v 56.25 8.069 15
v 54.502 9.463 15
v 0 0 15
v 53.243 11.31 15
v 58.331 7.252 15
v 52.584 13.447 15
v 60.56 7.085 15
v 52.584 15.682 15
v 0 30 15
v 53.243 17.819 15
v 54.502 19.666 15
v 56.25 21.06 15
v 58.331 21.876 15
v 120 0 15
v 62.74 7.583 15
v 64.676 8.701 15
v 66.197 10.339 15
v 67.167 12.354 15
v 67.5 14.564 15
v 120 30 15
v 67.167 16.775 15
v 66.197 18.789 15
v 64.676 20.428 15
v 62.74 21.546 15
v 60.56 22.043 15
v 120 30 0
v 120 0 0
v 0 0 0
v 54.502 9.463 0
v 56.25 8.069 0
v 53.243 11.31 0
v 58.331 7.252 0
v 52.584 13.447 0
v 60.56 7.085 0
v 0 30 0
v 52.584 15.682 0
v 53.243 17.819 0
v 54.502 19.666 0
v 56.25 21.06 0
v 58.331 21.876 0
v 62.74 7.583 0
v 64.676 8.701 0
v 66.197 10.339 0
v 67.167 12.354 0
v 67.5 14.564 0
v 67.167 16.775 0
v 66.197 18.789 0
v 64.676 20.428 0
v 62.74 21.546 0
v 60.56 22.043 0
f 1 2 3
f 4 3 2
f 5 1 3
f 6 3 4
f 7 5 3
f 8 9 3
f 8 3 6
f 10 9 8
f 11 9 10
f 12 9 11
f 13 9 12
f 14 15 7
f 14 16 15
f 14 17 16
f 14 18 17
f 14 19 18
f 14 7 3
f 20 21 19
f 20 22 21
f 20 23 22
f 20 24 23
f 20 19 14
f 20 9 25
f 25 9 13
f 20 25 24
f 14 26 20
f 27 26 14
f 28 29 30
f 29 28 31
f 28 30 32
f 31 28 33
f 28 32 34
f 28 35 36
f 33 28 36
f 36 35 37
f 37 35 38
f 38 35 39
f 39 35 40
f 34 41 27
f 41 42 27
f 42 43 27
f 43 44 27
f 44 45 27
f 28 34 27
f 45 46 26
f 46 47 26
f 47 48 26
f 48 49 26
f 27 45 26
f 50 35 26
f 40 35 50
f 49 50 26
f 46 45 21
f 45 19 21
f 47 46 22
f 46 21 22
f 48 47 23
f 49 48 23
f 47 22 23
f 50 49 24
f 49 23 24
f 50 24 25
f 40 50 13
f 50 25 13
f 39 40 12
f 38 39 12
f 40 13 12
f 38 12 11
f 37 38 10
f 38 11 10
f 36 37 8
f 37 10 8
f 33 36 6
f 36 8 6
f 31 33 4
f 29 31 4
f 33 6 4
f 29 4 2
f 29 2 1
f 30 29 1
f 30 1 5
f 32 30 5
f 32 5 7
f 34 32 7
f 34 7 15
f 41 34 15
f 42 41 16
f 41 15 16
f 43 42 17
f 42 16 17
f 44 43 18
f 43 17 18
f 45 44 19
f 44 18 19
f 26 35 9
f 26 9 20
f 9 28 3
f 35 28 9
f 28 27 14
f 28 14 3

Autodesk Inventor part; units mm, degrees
ref_plane "YZ Plane" through (0, 0, 0) normal (1, 0, 0) x (0, 1, 0)
ref_plane "XZ Plane" through (0, 0, 0) normal (0, 1, 0) x (-1, 0, 0)
ref_plane "XY Plane" through (0, 0, 0) normal (0, 0, 1) x (1, 0, 0)
sketch "스케치1" plane through (0, 0, 0) normal (0, 0, 1) x (1, 0, 0)
  line L0 (0, 30) -> (120, 30)
  line L1 (120, 30) -> (120, 0)
  line L2 (120, 0) -> (0, 0)
  line L3 (0, 0) -> (0, 30)
  dimension "d0" = 120
  dimension "d1" = 30
extrude "돌출1" add sketch "스케치1" along normal blind 15
sketch "스케치2" plane through (0, 0, 15) normal (0, 0, 1) x (1, 0, 0)
  circle A0 centre (30, 15) radius 7.5
  line L0 (120, 30) -> (0, 30) projected
  point P0 (0, 0)
  dimension "d4" = 15
  dimension "d5" = 15
sketch "스케치3" plane through (0, 0, 15) normal (0, 0, 1) x (1, 0, 0)
  circle A0 centre (60, 14.5644) radius 7.5
  line L0 (0, 30) -> (0, 0) projected
  dimension "d8" = 60
extrude "돌출2" cut sketch "스케치3" against normal up to surface (15 mm away)
properties part number "lever1.2"
